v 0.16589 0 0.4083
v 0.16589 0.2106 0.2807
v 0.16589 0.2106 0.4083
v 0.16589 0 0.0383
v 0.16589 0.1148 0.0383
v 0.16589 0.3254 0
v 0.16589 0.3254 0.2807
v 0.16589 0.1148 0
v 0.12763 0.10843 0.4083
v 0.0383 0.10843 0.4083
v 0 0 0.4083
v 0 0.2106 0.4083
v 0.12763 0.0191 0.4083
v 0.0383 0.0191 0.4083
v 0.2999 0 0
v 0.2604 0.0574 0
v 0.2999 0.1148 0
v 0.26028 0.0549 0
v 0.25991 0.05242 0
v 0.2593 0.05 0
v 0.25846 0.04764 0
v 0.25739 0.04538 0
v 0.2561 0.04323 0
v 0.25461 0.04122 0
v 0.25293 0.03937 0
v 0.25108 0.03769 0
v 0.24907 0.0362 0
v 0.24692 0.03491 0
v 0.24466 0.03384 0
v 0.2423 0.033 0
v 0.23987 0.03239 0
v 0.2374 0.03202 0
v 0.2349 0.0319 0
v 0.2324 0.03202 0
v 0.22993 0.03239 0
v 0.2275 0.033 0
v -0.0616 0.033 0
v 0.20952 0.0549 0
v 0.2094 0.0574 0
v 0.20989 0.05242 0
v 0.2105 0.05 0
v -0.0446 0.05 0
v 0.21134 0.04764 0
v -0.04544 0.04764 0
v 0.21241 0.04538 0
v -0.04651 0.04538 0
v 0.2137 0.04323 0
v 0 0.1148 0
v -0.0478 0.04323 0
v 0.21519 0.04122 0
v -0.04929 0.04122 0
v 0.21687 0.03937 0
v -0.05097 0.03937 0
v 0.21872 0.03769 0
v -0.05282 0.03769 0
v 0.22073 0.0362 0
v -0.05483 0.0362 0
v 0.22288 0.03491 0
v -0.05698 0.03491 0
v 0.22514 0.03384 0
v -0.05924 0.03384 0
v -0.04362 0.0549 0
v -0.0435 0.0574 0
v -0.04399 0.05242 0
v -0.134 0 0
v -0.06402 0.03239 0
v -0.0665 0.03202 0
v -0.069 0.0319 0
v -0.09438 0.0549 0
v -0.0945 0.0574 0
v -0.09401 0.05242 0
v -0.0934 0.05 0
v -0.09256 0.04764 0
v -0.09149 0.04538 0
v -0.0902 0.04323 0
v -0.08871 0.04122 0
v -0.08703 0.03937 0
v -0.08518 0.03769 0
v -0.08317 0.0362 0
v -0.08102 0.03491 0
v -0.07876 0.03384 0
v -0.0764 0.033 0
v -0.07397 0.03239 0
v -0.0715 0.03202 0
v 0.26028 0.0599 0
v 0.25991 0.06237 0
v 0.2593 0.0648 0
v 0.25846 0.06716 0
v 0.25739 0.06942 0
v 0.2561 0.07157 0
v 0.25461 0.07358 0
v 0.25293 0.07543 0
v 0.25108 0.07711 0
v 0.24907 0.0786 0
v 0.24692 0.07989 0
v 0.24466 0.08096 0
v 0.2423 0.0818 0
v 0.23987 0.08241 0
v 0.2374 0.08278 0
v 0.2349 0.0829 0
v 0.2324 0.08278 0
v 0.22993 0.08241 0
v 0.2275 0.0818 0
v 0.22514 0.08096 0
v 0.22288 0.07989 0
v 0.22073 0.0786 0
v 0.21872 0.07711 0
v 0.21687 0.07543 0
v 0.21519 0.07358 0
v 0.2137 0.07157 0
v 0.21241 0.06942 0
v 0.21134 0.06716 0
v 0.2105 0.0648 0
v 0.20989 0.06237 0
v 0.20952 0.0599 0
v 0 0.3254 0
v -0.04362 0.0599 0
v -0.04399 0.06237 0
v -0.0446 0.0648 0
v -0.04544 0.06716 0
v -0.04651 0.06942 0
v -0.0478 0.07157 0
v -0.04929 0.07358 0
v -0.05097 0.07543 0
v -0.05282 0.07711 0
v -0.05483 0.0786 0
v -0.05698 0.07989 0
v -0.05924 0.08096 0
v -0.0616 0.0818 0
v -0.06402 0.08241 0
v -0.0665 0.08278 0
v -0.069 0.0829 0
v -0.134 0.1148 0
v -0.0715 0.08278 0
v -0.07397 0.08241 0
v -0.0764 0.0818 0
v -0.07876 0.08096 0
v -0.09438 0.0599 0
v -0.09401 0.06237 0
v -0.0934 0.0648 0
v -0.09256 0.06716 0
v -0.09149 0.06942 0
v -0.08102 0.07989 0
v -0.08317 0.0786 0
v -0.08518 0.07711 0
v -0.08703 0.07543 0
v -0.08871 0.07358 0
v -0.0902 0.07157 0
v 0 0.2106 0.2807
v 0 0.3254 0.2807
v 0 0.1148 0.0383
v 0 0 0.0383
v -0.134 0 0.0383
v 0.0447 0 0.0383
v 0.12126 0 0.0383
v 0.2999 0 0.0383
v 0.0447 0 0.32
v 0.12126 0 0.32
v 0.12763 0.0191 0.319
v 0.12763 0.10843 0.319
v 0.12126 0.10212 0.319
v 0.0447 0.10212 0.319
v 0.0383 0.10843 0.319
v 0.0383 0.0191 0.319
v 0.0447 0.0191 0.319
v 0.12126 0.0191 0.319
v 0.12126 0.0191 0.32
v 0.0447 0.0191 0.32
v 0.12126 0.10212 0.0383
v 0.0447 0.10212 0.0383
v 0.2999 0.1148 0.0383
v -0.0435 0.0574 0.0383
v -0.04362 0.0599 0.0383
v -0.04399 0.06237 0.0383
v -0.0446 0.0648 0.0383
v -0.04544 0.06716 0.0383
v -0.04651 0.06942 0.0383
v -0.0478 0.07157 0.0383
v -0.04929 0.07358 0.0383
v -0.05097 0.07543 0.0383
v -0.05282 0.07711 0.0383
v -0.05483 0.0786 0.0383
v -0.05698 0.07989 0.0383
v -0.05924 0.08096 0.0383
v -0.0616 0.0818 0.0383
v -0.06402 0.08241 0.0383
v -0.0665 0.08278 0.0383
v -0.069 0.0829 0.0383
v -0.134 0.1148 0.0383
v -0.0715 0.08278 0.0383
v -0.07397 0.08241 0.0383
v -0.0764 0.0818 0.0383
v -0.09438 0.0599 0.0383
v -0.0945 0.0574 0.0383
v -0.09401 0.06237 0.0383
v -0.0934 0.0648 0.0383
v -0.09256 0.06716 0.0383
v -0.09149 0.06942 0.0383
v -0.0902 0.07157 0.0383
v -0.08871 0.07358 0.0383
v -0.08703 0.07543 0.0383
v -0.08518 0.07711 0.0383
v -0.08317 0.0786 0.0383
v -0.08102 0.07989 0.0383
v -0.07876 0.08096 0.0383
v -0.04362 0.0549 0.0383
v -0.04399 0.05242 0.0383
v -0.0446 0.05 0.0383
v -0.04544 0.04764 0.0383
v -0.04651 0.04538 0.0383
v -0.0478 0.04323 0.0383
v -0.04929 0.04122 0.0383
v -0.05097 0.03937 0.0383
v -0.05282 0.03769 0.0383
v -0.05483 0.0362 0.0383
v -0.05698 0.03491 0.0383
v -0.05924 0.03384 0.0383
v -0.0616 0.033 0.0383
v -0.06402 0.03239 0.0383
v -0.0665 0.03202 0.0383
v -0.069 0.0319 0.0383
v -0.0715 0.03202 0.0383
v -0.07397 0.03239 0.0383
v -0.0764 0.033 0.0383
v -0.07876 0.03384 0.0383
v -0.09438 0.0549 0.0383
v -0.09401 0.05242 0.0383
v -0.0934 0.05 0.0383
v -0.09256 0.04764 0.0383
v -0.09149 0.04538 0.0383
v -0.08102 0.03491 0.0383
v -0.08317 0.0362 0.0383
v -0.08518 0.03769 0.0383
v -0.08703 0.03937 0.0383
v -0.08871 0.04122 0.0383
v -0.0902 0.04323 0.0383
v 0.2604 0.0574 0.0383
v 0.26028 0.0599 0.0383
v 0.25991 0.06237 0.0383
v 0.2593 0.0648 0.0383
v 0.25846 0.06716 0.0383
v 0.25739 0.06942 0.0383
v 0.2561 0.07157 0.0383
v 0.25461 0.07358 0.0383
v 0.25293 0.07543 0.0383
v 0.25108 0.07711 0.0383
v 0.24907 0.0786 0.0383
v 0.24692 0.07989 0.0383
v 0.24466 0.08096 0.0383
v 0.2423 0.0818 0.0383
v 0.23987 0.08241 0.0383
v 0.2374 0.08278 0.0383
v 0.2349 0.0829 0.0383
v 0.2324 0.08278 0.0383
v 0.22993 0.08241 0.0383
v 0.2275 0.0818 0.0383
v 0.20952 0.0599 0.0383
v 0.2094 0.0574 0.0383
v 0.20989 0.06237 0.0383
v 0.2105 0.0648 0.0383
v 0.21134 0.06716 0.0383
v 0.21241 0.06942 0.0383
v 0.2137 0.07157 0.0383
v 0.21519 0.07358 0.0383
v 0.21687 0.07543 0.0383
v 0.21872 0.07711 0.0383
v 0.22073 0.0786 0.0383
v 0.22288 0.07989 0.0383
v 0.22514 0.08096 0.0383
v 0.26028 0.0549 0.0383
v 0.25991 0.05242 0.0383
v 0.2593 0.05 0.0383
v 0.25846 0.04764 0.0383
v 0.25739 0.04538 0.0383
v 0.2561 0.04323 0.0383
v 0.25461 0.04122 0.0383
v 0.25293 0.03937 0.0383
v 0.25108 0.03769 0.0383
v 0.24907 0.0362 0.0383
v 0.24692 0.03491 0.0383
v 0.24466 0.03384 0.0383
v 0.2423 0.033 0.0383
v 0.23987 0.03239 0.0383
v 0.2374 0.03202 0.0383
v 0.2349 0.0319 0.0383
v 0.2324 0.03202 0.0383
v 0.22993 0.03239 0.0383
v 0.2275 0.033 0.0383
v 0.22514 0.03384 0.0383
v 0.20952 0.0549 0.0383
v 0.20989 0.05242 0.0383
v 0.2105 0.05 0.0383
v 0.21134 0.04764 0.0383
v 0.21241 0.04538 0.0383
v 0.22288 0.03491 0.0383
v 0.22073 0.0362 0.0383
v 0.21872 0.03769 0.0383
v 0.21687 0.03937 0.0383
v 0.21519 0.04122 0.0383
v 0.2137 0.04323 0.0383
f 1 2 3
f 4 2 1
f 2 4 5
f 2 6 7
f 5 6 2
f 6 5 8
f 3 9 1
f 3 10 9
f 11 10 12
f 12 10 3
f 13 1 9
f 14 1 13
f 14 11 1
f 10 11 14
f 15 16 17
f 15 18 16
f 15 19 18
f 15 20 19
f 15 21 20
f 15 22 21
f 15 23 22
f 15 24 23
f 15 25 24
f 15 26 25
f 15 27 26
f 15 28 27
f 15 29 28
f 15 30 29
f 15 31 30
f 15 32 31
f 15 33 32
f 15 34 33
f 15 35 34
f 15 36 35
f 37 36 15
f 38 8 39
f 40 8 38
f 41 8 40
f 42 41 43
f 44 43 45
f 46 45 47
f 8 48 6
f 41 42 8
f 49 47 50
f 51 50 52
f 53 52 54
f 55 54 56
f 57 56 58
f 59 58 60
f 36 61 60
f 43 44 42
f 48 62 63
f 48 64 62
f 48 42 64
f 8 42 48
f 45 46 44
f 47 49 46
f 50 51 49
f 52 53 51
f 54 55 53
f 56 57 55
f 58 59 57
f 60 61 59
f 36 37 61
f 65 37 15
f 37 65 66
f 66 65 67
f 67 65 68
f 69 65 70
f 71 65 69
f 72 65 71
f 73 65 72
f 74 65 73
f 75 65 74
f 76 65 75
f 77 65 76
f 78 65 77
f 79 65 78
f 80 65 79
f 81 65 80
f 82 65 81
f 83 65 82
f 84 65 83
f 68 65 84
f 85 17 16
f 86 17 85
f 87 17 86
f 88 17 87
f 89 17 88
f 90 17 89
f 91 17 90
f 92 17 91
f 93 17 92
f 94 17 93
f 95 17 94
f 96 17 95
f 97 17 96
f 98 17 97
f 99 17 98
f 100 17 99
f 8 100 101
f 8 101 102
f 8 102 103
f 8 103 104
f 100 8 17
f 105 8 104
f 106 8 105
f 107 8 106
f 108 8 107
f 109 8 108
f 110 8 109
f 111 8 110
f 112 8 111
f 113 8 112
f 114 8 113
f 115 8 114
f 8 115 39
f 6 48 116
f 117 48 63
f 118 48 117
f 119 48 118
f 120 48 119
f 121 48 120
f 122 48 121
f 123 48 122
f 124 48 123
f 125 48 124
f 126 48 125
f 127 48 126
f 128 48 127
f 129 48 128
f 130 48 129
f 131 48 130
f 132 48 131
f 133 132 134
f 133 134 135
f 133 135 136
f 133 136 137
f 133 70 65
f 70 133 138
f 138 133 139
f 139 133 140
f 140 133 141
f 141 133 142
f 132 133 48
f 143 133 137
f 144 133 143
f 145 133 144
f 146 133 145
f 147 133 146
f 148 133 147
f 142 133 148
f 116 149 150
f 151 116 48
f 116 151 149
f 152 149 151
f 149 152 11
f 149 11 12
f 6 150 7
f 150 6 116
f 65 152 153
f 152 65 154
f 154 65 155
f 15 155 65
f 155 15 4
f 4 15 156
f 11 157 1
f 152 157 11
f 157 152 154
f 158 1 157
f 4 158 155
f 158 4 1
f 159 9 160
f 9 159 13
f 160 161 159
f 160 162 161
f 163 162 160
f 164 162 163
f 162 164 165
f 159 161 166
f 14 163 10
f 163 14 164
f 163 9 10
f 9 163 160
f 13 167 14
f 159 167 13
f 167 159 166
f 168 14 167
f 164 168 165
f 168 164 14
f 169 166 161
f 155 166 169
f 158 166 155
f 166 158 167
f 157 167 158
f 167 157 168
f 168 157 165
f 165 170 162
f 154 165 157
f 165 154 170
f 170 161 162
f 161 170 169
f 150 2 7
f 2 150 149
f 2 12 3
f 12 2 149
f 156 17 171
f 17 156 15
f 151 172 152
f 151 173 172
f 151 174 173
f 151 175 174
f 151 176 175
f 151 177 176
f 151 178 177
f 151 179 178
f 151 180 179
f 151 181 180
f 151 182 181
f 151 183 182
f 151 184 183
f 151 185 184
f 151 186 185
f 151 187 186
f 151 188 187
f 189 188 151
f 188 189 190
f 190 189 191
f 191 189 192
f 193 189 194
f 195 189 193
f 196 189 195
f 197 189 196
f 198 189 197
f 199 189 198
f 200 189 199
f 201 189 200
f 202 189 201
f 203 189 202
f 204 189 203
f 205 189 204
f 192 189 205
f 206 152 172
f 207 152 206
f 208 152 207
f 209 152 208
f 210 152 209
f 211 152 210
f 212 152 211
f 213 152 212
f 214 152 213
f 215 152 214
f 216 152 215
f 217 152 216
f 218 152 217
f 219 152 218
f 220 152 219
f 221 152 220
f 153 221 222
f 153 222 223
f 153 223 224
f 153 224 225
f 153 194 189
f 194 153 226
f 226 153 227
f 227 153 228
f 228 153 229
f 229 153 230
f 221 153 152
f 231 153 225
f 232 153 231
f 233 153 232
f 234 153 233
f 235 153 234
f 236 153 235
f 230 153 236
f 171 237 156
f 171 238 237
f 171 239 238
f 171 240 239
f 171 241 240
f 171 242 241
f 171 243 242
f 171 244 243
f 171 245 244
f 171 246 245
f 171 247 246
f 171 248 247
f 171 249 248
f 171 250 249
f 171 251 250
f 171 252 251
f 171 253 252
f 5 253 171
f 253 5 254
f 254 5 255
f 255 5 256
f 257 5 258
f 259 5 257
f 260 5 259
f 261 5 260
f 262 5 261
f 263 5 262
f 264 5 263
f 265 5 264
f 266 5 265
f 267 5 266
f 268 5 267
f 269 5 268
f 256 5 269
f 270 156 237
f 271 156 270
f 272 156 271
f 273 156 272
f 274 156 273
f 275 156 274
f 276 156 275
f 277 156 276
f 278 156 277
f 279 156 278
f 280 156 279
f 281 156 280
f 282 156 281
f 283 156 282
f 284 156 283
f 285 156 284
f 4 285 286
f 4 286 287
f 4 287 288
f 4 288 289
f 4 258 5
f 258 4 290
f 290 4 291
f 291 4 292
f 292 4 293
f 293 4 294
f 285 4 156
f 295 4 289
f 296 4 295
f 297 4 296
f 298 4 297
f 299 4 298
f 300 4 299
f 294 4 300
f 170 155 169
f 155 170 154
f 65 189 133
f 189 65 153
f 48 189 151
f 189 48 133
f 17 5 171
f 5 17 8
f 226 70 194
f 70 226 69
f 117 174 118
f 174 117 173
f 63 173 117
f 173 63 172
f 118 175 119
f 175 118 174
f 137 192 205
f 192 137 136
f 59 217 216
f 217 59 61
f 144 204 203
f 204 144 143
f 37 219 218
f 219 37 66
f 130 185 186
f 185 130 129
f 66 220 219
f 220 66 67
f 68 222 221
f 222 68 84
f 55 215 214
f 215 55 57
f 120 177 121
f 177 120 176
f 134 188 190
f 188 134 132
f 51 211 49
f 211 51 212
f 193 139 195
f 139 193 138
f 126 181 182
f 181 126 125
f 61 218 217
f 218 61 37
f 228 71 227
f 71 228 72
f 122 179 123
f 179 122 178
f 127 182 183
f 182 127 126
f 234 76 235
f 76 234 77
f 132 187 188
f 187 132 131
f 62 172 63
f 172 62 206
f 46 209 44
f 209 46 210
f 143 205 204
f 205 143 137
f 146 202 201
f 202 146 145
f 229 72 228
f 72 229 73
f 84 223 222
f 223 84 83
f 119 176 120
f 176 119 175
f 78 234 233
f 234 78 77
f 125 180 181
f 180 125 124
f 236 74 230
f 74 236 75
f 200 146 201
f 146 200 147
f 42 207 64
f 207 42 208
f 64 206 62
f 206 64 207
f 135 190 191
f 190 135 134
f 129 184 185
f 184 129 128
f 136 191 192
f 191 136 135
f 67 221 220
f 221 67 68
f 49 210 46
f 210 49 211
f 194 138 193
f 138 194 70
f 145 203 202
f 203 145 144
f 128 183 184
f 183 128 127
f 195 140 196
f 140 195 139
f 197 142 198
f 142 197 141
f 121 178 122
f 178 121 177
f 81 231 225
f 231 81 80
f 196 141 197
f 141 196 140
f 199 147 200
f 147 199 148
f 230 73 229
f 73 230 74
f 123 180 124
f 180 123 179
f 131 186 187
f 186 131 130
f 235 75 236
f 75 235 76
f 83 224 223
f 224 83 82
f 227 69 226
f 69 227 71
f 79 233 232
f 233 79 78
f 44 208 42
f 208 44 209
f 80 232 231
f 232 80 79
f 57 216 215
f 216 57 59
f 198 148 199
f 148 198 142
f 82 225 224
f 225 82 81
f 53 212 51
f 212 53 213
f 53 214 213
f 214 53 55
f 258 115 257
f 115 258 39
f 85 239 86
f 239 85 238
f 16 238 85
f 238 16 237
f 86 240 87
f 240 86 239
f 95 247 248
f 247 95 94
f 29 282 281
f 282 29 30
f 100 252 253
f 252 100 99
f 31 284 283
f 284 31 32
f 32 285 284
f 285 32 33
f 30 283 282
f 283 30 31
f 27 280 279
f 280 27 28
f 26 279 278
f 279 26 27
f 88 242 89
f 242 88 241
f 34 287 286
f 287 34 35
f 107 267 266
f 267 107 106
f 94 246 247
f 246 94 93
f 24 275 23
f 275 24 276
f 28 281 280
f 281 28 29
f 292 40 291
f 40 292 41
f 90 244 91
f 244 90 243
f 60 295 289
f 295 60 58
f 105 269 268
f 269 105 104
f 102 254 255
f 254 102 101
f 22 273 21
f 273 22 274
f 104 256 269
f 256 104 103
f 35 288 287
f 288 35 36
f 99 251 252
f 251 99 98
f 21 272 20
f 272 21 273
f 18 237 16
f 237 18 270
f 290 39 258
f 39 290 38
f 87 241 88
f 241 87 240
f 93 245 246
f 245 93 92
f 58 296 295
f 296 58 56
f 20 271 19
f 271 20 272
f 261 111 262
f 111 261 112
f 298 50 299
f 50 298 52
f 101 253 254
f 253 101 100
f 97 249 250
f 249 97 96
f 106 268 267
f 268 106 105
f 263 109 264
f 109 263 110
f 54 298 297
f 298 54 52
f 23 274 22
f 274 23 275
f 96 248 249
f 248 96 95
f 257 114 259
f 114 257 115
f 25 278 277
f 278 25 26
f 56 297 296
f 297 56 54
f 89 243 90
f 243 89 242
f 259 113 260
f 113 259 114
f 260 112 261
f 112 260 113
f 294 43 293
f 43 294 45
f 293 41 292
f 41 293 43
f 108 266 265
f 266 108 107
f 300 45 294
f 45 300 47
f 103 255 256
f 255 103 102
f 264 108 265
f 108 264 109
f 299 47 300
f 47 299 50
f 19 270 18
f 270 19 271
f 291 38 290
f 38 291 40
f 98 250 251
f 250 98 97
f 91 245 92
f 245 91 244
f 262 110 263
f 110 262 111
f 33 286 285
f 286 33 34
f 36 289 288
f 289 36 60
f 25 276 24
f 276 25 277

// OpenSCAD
// Global Resolution Setting
$fn = 64;

// --------------------------
// Base Dimension Parameters
// --------------------------
base_length = 0.165891;    // X-axis span of main base
base_width = 0.325401;     // Y-axis span of main base
base_height = 0.408347;    // Total Z height of main base
main_extrusion_depth = 0.4083; // Working Z height for cut references

// --------------------------
// Top Square Recess Params
// --------------------------
recess_side = 0.089326;
recess_left_offset = 0.0383;
recess_front_offset = 0.0191;
recess_bottom_z = 0.319;
recess_top_z = main_extrusion_depth;
recess_depth = recess_top_z - recess_bottom_z;

// --------------------------
// Lower Opening Params
// --------------------------
lower_opening_width = 0.076565;
lower_opening_depth = 0.132416;
lower_opening_left_offset = 0.0447;
lower_opening_front_offset = -0.0303;
lower_opening_top_z = 0.319;

// --------------------------
// Upper Back Strip Cut Params
// --------------------------
back_strip_width = 0.114848;
back_strip_front_gap = 0.2106;
back_strip_bottom_z = 0.2807;
back_strip_top_z = main_extrusion_depth;

// --------------------------
// Shallow Base Section Params
// --------------------------
shallow_height = 0.0383;
shallow_total_width = 0.4339;
shallow_depth = 0.1148;
shallow_side_projection = 0.134;

// --------------------------
// Shallow Section Hole Params
// --------------------------
hole_radius = 0.0255;
hole_front_offset = 0.0574;
hole1_x = -0.069;
hole2_x = 0.2349;

// --------------------------
// Main Model Assembly
// --------------------------
union() {
    // Main base with all cut features
    difference() {
        // Base solid
        cube([base_length, base_width, main_extrusion_depth]);

        // Cut top square recess
        translate([recess_left_offset, recess_front_offset, recess_bottom_z])
        cube([recess_side, recess_side, recess_depth + 0.001]); // Small oversize ensures clean cut

        // Cut lower through opening
        translate([lower_opening_left_offset, lower_opening_front_offset, 0])
        cube([lower_opening_width, lower_opening_depth, lower_opening_top_z + 0.001]);

        // Cut upper back step strip
        translate([0, back_strip_front_gap, back_strip_bottom_z])
        cube([base_length, back_strip_width, (back_strip_top_z - back_strip_bottom_z) + 0.001]);
    }

    // Shallow front base extension with mounting holes
    difference() {
        // Shallow section solid
        translate([-shallow_side_projection, 0, 0])
        cube([shallow_total_width, shallow_depth, shallow_height]);

        // Cut left mounting hole
        translate([hole1_x, hole_front_offset, -0.001])
        cylinder(h = shallow_height + 0.002, r = hole_radius);

        // Cut right mounting hole
        translate([hole2_x, hole_front_offset, -0.001])
        cylinder(h = shallow_height + 0.002, r = hole_radius);
    }
}
